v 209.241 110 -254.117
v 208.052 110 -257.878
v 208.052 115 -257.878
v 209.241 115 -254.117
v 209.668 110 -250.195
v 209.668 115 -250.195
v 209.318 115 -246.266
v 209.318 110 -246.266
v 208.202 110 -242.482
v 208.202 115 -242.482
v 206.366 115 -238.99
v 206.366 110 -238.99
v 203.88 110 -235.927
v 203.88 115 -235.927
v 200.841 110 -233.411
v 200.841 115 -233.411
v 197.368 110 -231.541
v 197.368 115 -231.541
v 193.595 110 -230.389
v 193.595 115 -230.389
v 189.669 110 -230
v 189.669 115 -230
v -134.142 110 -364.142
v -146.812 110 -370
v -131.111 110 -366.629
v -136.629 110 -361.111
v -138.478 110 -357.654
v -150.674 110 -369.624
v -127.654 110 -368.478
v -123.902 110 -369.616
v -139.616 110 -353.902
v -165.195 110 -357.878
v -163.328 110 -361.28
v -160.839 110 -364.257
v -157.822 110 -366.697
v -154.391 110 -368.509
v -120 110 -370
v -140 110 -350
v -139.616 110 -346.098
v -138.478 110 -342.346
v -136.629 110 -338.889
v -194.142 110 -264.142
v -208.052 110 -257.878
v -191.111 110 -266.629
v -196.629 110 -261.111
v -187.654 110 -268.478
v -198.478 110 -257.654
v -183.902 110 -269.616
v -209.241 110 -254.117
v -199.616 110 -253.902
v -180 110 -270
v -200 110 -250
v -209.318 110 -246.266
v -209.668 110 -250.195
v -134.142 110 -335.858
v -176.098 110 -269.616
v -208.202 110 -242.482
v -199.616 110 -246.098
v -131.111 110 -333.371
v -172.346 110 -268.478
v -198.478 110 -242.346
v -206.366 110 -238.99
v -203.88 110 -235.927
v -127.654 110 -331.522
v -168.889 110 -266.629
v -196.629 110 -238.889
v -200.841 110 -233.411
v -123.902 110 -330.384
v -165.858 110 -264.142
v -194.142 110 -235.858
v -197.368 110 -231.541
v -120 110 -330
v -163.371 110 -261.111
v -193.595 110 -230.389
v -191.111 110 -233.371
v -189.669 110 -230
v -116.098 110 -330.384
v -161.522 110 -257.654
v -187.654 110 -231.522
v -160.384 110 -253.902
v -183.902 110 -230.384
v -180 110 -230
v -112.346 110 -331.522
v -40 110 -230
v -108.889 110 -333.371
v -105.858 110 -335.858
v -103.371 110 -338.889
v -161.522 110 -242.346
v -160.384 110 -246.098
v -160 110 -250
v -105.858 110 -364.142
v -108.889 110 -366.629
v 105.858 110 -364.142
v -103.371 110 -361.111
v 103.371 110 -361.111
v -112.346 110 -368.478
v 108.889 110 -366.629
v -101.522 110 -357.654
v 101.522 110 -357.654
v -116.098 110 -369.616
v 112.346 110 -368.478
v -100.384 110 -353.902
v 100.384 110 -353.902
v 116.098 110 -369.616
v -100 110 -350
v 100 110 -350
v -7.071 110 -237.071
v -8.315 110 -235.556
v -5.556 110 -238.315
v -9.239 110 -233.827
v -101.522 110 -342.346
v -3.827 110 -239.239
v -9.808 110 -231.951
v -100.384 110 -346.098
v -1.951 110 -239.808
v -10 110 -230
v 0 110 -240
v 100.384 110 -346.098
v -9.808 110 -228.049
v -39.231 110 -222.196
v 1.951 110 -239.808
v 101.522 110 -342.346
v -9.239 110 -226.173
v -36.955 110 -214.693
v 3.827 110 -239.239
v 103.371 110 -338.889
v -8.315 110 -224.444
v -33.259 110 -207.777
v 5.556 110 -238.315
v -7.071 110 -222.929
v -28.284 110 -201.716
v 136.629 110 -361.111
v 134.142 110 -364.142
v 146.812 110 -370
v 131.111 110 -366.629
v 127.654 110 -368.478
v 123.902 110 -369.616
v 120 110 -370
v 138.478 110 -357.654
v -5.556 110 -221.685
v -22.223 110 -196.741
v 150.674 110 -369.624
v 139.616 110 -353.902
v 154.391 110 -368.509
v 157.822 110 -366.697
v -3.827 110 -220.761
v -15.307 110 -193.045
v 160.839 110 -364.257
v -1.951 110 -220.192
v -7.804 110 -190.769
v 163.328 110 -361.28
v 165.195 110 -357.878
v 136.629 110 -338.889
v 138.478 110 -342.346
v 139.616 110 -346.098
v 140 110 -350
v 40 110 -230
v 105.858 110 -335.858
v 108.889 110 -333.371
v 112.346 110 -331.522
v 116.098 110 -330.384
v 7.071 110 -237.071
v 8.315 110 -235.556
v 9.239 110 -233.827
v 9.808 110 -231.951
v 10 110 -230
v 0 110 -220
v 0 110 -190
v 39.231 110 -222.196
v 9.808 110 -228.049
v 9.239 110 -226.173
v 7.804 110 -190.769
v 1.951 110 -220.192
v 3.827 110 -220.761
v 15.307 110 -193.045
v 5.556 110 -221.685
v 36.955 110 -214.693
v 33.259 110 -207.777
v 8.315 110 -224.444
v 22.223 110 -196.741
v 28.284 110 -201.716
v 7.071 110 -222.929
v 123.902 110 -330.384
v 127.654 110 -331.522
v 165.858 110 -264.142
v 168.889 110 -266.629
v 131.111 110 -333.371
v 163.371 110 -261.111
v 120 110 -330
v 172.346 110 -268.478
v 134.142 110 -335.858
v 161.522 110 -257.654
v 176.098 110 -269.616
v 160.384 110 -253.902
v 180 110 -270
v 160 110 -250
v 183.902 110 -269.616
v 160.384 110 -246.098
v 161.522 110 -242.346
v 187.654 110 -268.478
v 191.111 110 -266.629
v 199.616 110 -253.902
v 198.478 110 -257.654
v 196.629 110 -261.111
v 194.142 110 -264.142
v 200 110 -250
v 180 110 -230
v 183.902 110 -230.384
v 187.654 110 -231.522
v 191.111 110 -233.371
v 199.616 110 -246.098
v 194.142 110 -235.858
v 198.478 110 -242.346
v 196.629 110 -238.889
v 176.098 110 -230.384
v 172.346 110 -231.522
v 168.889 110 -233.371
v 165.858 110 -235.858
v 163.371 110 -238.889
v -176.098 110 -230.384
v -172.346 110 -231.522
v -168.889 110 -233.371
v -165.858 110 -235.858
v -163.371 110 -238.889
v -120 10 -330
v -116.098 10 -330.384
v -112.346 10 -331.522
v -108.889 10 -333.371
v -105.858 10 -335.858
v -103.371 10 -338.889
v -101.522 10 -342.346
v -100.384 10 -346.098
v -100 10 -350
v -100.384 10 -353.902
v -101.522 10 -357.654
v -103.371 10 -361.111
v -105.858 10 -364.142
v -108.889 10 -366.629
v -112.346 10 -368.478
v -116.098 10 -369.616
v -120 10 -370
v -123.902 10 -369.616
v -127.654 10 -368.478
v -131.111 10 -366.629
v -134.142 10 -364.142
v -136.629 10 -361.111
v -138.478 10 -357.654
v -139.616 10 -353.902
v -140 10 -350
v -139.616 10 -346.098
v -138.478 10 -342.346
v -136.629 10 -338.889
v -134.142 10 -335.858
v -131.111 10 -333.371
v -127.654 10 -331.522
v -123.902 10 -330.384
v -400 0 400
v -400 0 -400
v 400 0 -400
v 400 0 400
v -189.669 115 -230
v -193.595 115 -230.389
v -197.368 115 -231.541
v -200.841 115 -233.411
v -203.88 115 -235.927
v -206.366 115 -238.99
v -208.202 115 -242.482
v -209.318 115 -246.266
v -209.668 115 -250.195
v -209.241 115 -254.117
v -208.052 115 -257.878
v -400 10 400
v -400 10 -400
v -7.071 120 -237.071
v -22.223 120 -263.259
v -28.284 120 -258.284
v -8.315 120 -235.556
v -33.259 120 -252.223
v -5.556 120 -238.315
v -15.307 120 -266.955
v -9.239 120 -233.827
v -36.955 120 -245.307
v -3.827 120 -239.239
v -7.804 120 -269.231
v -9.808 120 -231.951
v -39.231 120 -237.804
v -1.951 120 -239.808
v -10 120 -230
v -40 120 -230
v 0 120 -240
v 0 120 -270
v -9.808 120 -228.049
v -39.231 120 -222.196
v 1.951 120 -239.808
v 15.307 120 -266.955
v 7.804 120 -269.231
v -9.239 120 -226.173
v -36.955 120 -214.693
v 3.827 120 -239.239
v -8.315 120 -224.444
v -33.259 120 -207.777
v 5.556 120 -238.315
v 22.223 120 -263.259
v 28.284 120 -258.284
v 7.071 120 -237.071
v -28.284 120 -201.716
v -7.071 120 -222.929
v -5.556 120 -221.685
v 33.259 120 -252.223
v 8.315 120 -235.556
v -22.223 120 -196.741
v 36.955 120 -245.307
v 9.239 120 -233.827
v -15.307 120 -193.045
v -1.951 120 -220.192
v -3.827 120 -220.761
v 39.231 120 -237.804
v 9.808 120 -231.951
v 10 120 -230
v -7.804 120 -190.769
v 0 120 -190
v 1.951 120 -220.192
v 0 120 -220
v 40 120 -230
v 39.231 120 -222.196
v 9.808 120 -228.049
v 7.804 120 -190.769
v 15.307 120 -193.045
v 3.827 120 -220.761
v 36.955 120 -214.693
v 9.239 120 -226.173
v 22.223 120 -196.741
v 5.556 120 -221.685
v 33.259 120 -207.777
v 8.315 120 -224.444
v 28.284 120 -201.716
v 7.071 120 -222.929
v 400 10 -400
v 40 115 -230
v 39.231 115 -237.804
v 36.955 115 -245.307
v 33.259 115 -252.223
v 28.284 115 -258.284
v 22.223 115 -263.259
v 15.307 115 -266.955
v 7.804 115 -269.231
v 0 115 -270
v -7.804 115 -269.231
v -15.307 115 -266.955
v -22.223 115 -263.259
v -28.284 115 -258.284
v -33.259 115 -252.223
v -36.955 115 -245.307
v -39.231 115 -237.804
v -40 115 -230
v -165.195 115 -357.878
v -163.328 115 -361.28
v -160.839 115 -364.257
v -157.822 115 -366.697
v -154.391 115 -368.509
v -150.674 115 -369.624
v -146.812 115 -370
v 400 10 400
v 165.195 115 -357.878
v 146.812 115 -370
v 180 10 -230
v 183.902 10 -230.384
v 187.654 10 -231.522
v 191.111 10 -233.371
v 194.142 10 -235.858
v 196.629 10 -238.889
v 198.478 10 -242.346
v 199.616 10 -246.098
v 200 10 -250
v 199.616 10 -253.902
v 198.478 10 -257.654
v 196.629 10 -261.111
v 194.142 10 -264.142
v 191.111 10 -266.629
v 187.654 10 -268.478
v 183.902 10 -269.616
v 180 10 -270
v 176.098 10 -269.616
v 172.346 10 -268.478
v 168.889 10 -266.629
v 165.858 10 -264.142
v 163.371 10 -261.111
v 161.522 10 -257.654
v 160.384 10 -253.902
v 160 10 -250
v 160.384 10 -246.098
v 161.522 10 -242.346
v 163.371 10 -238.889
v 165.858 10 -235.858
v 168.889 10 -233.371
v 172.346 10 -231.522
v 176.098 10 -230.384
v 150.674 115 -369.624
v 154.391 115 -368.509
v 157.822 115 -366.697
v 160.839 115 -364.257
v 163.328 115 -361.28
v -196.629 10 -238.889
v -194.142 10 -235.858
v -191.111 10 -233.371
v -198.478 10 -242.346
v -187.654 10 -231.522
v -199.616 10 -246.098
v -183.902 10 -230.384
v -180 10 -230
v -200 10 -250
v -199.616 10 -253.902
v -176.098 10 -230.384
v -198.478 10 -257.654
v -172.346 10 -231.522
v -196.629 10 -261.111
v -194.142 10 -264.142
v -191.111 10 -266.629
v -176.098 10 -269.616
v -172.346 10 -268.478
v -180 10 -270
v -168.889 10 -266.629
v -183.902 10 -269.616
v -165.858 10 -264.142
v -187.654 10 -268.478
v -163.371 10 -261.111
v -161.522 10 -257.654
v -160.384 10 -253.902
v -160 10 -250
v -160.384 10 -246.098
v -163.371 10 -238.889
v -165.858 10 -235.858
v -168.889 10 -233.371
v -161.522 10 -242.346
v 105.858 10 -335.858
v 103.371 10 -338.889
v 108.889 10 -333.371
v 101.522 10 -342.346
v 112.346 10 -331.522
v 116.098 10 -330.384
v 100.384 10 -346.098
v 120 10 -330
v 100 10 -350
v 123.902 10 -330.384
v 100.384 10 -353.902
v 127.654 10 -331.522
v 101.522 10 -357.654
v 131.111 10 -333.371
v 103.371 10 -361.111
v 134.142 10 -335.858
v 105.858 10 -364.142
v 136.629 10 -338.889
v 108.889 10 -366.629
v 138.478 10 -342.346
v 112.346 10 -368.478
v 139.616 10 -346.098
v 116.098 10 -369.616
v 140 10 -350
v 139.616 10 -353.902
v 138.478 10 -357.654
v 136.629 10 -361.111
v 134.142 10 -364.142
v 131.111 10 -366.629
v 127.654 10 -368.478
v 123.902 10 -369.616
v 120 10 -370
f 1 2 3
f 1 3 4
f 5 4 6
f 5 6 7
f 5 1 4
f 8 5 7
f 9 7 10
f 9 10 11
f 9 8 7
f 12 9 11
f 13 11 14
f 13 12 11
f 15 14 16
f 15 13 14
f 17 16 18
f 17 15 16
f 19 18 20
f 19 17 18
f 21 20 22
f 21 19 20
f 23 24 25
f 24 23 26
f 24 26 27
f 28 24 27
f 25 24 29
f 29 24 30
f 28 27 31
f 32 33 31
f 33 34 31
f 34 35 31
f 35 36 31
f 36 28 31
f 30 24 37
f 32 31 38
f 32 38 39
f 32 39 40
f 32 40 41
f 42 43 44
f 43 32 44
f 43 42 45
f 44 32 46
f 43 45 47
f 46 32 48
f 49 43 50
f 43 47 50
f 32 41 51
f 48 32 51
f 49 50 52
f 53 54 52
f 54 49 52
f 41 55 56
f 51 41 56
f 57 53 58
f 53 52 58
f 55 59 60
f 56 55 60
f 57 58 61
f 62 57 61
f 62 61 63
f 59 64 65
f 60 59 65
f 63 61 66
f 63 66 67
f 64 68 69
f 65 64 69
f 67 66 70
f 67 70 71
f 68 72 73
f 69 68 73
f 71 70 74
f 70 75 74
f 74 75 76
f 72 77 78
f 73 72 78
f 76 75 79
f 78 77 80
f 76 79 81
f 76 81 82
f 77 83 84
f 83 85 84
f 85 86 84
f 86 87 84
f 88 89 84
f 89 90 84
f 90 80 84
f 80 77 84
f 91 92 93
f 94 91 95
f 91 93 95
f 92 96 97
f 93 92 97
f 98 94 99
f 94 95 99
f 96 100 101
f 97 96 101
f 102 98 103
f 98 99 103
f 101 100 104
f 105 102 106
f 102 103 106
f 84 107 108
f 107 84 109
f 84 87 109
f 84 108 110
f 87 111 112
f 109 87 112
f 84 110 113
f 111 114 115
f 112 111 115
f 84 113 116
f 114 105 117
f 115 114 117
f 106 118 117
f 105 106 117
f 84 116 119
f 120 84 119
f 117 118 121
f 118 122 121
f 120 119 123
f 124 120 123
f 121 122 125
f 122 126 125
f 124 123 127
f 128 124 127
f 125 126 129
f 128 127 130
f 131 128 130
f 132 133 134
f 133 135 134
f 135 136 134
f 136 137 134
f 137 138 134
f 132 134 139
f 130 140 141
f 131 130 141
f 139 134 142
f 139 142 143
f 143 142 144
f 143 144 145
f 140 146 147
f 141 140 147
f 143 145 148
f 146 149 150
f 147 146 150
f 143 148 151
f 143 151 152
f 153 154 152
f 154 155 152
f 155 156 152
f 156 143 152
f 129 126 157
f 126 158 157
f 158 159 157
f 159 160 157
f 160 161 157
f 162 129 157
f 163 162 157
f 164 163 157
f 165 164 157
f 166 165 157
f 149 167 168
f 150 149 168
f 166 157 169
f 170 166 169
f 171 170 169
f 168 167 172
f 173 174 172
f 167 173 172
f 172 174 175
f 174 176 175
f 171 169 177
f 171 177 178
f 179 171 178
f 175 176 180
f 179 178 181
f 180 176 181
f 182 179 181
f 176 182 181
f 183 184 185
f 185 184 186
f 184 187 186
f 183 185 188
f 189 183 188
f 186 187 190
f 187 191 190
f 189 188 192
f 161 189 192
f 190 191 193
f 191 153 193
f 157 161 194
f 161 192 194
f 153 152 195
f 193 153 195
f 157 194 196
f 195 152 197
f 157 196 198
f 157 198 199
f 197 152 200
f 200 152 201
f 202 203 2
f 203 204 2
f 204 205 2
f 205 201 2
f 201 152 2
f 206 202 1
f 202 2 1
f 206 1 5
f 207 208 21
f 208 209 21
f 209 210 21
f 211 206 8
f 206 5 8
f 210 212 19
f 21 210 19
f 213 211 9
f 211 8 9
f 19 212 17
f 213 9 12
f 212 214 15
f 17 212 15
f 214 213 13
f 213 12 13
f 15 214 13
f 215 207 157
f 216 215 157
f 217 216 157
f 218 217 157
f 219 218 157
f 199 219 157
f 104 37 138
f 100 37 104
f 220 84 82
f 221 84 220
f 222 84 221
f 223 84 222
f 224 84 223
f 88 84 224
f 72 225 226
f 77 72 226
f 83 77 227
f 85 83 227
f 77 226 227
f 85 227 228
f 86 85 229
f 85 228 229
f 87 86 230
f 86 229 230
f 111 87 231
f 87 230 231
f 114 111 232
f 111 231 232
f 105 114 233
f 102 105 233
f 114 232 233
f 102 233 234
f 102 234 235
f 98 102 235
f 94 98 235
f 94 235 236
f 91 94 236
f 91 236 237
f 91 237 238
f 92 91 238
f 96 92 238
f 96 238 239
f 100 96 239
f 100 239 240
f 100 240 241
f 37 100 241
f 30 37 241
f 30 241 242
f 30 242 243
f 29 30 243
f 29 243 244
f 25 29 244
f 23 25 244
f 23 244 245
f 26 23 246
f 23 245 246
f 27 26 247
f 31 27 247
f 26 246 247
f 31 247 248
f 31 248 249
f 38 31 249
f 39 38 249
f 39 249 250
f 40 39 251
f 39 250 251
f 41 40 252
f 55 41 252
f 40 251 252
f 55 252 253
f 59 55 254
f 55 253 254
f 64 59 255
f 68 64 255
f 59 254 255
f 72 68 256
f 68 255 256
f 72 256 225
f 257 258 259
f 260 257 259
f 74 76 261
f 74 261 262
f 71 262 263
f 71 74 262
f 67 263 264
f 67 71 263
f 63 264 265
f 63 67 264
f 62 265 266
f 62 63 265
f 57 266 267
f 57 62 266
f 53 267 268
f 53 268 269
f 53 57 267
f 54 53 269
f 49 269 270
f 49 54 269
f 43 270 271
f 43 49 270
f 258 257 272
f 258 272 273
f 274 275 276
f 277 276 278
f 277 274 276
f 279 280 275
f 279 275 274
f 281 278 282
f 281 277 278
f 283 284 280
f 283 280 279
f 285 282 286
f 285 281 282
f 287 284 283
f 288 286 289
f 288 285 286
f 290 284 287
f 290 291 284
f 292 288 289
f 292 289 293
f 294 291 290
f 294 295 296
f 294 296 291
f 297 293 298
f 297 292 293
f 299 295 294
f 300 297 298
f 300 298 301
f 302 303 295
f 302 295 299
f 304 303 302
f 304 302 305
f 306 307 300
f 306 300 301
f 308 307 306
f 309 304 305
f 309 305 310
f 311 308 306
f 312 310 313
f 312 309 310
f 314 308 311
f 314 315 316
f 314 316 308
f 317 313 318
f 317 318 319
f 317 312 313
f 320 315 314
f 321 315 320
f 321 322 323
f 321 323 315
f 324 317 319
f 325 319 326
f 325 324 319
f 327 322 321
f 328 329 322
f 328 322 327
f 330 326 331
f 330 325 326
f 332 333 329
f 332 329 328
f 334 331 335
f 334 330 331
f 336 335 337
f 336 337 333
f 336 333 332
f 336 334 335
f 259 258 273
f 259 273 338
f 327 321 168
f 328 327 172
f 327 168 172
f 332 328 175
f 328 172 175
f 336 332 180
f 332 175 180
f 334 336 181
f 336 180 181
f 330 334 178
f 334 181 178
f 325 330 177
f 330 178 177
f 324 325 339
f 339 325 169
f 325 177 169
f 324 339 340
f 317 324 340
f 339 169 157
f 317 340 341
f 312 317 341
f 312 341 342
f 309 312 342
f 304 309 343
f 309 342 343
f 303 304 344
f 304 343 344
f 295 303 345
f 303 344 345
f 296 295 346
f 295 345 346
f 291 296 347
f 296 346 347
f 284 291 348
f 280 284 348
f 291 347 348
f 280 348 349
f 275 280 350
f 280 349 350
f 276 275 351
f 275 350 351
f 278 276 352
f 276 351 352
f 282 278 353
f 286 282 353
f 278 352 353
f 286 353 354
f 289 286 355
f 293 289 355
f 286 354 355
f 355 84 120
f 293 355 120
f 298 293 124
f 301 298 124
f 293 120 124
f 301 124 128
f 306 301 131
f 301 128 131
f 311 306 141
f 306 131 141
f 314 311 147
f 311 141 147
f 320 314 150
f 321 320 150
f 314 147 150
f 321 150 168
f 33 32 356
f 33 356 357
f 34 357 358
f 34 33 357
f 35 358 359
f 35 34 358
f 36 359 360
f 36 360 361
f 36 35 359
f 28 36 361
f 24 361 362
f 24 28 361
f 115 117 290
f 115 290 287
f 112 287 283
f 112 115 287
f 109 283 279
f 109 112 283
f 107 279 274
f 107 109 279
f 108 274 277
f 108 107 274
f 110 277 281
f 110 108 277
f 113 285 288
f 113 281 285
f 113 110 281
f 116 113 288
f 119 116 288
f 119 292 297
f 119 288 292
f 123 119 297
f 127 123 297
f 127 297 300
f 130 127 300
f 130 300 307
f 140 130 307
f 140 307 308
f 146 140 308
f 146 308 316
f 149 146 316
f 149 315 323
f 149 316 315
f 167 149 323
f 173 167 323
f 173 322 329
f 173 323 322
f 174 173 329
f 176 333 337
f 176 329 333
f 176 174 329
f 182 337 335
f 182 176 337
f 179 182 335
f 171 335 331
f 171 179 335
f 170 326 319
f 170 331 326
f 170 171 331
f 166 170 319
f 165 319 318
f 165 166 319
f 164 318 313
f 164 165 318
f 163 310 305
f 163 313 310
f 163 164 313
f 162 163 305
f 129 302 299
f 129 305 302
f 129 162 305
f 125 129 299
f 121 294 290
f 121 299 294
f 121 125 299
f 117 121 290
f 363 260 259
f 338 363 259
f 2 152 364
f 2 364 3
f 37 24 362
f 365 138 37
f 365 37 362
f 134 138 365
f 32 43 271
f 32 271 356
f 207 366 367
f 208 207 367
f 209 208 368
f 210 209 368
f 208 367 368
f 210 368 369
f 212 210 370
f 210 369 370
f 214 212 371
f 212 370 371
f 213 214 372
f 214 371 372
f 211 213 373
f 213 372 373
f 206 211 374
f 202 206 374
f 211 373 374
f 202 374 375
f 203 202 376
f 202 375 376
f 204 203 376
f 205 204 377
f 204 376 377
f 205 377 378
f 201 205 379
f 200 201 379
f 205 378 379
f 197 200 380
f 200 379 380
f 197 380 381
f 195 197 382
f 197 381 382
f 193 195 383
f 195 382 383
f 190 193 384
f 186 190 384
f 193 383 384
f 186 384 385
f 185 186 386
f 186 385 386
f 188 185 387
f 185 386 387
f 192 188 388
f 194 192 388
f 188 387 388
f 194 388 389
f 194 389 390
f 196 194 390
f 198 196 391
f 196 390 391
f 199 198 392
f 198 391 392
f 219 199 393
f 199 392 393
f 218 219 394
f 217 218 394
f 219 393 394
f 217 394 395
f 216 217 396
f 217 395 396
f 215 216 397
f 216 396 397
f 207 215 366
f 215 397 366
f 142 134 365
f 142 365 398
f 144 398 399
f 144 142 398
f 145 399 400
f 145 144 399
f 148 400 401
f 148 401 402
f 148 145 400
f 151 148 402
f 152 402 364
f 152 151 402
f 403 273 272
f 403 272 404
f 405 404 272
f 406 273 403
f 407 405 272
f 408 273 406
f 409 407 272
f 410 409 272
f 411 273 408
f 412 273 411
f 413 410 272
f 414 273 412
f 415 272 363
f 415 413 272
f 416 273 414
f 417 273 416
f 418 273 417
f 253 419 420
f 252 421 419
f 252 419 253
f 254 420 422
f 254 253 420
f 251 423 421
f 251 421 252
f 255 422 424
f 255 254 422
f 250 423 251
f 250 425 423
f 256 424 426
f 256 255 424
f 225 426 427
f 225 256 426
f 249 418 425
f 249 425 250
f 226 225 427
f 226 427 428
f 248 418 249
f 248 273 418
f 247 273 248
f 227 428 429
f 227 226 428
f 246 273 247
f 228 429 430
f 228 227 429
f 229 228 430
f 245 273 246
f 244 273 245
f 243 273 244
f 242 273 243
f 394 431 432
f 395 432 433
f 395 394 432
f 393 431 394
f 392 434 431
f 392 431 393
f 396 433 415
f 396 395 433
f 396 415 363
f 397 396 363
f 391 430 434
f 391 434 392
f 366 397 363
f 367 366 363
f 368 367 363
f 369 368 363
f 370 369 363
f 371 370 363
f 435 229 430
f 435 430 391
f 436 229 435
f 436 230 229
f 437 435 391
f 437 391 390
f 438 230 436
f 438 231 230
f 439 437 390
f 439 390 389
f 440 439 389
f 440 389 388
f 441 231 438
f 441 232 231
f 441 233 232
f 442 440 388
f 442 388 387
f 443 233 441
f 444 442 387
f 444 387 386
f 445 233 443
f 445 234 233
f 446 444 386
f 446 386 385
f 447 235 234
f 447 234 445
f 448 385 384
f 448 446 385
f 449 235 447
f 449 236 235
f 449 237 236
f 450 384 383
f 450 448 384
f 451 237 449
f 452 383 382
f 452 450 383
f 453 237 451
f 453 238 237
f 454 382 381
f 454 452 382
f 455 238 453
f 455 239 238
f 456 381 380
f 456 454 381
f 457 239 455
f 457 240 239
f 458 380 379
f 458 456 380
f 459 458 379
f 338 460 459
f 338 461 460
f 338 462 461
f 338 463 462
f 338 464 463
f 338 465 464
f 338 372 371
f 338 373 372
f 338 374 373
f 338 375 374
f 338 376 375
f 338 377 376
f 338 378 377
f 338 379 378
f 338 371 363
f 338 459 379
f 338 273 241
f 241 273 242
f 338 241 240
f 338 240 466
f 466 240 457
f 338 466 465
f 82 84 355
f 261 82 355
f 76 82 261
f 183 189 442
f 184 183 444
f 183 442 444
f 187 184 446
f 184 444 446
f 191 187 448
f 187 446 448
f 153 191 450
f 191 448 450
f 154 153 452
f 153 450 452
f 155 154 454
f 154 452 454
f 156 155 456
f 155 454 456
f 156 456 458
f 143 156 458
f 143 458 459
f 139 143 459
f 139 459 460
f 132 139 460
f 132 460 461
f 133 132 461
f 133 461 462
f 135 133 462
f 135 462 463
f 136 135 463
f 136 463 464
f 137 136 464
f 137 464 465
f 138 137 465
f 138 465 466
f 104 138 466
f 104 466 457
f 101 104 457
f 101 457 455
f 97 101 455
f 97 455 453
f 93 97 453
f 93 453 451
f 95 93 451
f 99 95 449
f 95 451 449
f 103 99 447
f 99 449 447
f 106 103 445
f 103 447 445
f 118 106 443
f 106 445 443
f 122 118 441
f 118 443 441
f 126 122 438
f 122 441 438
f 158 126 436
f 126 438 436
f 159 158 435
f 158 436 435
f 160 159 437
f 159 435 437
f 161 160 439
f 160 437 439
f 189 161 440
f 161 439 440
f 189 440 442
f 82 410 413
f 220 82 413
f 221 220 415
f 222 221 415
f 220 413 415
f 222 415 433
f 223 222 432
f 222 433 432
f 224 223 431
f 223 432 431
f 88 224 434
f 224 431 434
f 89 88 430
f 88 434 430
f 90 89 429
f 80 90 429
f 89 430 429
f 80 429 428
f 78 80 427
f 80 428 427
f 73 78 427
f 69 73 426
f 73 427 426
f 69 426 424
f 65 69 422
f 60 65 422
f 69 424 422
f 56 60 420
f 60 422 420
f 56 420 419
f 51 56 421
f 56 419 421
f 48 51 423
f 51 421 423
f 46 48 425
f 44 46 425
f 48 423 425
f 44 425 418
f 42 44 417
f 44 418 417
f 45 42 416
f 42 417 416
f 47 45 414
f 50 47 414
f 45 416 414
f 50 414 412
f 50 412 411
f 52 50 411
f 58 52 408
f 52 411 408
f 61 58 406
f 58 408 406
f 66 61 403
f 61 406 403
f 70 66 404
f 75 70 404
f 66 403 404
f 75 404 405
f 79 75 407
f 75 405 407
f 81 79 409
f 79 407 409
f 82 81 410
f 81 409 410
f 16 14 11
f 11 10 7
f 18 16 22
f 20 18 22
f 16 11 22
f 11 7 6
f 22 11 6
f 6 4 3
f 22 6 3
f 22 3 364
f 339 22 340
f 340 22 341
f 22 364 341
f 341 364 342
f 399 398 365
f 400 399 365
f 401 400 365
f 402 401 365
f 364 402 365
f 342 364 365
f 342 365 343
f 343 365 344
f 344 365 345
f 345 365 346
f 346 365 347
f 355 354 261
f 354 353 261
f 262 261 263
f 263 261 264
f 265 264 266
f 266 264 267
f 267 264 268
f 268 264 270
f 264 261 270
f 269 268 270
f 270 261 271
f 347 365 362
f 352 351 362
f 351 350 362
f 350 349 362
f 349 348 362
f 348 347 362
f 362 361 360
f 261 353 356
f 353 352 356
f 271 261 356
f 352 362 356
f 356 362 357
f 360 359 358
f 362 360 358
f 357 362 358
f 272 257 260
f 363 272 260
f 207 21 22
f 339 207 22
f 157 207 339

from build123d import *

# Parameters (mm, degrees)
SKETCH1_W                = 800
SKETCH1_H                = 800
BOSS_EXTRUDE4_DEPTH      = 10
SKETCH6_R                = 20
BOSS_EXTRUDE5_DEPTH      = 100
BOSS_EXTRUDE6_DEPTH      = 5
BOSS_EXTRUDE7_DEPTH      = 5
BOSS_EXTRUDE7_DEPTH_BACK = 5
SKETCH8_R                = 40
CUT_EXTRUDE1_DEPTH       = 5
CUT_EXTRUDE1_DEPTH_BACK  = 24
SKETCH9_R                = 10


with BuildPart() as part:
    # Sketch1 → Boss-Extrude4 (new body)
    with BuildSketch(Plane(origin=(0, 0, 0), x_dir=(1, 0, 0), z_dir=(0, 1, 0))):
        Rectangle(SKETCH1_W, SKETCH1_H)
    extrude(amount=BOSS_EXTRUDE4_DEPTH)

    # Sketch6 → Boss-Extrude5 (add)
    with BuildSketch(Plane(origin=(0, 10, 0), x_dir=(1, 0, 0), z_dir=(0, 1, 0))):
        with Locations(Location((120, 350, 0), (0, 0, 270))):
            Circle(SKETCH6_R)
        with Locations(Location((-120, 350, 0), (0, 0, 270))):
            Circle(SKETCH6_R)
        with Locations(Location((-180, 250, 0), (0, 0, 270))):
            Circle(SKETCH6_R)
        with Locations(Location((180, 250, 0), (0, 0, 270))):
            Circle(SKETCH6_R)
    extrude(amount=BOSS_EXTRUDE5_DEPTH)

    # Sketch7 → Boss-Extrude6 (add)
    with BuildSketch(Plane(origin=(0, 110, 0), x_dir=(1, 0, 0), z_dir=(0, 1, 0))):
        with BuildLine():
            Line((-120, 370), (120, 370))
            Line((120, 370), (146.81207684, 370))
            ThreePointArc((146.81207684, 370), (157.821897015, 366.696821845), (165.194977441, 357.878385972))
            Line((165.194977441, 357.878385972), (208.052120298, 257.878385972))
            ThreePointArc((208.052120298, 257.878385972), (206.366041542, 238.990179825), (189.669219698, 230))
            Line((189.669219698, 230), (180, 230))
            Line((180, 230), (-180, 230))
            Line((-180, 230), (-189.669219698, 230))
            ThreePointArc((-189.669219698, 230), (-206.366041542, 238.990179825), (-208.052120298, 257.878385972))
            Line((-208.052120298, 257.878385972), (-165.194977441, 357.878385972))
            ThreePointArc((-165.194977441, 357.878385972), (-157.821897015, 366.696821845), (-146.81207684, 370))
            Line((-146.81207684, 370), (-120, 370))
        make_face()
    extrude(amount=BOSS_EXTRUDE6_DEPTH)

    # Sketch8 → Boss-Extrude7 (add, two sides: drawn at the far end of the back side and taken through both)
    with BuildSketch(Plane(origin=(0, 115, 0), x_dir=(1, 0, 0), z_dir=(0, 1, 0)).offset(-BOSS_EXTRUDE7_DEPTH_BACK)):
        with Locations(Location((0, 230, 0), (0, 0, 270))):
            Circle(SKETCH8_R)
    extrude(amount=BOSS_EXTRUDE7_DEPTH + BOSS_EXTRUDE7_DEPTH_BACK)

    # Sketch9 → Cut-Extrude1 (cut, two sides: drawn at the far end of the back side and taken through both)
    with BuildSketch(Plane(origin=(0, 120, 0), x_dir=(1, 0, 0), z_dir=(0, 1, 0)).offset(-CUT_EXTRUDE1_DEPTH_BACK)):
        with Locations(Location((0, 230, 0), (0, 0, 90))):
            Circle(SKETCH9_R)
    extrude(amount=CUT_EXTRUDE1_DEPTH + CUT_EXTRUDE1_DEPTH_BACK, mode=Mode.SUBTRACT)


solid = part.part
